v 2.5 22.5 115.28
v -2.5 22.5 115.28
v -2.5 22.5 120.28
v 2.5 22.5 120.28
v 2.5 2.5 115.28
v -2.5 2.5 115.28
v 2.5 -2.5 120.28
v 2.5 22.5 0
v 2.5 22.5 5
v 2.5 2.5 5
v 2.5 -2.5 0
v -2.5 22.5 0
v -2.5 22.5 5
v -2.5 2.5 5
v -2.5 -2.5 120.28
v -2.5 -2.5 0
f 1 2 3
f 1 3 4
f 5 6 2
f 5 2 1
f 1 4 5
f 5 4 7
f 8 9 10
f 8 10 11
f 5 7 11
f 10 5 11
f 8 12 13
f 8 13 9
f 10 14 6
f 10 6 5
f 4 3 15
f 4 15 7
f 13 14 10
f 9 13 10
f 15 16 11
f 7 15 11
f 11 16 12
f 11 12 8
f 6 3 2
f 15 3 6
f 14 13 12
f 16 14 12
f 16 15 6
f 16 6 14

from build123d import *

# Parameters (mm, degrees)
ESQUISSE1_W        = 5
ESQUISSE1_H        = 5
BOSS_EXTRU_1_DEPTH = 120.28
ESQUISSE3_W        = 5
ESQUISSE3_H        = 5
BOSS_EXTRU_2_DEPTH = 20


with BuildPart() as part:
    # Esquisse1 → Boss.-Extru.1 (new body)
    with BuildSketch(Plane.XY):
        Rectangle(ESQUISSE1_W, ESQUISSE1_H)
    extrude(amount=BOSS_EXTRU_1_DEPTH)

    # Esquisse3 → Boss.-Extru.2 (add)
    with BuildSketch(Plane(origin=(0, 2.5, 0), x_dir=(1, 0, 0), z_dir=(0, 1, 0))):
        with Locations((0, -2.5)):
            Rectangle(ESQUISSE3_W, ESQUISSE3_H)
        with Locations((0, -117.78)):
            Rectangle(ESQUISSE3_W, ESQUISSE3_H)
    extrude(amount=BOSS_EXTRU_2_DEPTH)


solid = part.part
